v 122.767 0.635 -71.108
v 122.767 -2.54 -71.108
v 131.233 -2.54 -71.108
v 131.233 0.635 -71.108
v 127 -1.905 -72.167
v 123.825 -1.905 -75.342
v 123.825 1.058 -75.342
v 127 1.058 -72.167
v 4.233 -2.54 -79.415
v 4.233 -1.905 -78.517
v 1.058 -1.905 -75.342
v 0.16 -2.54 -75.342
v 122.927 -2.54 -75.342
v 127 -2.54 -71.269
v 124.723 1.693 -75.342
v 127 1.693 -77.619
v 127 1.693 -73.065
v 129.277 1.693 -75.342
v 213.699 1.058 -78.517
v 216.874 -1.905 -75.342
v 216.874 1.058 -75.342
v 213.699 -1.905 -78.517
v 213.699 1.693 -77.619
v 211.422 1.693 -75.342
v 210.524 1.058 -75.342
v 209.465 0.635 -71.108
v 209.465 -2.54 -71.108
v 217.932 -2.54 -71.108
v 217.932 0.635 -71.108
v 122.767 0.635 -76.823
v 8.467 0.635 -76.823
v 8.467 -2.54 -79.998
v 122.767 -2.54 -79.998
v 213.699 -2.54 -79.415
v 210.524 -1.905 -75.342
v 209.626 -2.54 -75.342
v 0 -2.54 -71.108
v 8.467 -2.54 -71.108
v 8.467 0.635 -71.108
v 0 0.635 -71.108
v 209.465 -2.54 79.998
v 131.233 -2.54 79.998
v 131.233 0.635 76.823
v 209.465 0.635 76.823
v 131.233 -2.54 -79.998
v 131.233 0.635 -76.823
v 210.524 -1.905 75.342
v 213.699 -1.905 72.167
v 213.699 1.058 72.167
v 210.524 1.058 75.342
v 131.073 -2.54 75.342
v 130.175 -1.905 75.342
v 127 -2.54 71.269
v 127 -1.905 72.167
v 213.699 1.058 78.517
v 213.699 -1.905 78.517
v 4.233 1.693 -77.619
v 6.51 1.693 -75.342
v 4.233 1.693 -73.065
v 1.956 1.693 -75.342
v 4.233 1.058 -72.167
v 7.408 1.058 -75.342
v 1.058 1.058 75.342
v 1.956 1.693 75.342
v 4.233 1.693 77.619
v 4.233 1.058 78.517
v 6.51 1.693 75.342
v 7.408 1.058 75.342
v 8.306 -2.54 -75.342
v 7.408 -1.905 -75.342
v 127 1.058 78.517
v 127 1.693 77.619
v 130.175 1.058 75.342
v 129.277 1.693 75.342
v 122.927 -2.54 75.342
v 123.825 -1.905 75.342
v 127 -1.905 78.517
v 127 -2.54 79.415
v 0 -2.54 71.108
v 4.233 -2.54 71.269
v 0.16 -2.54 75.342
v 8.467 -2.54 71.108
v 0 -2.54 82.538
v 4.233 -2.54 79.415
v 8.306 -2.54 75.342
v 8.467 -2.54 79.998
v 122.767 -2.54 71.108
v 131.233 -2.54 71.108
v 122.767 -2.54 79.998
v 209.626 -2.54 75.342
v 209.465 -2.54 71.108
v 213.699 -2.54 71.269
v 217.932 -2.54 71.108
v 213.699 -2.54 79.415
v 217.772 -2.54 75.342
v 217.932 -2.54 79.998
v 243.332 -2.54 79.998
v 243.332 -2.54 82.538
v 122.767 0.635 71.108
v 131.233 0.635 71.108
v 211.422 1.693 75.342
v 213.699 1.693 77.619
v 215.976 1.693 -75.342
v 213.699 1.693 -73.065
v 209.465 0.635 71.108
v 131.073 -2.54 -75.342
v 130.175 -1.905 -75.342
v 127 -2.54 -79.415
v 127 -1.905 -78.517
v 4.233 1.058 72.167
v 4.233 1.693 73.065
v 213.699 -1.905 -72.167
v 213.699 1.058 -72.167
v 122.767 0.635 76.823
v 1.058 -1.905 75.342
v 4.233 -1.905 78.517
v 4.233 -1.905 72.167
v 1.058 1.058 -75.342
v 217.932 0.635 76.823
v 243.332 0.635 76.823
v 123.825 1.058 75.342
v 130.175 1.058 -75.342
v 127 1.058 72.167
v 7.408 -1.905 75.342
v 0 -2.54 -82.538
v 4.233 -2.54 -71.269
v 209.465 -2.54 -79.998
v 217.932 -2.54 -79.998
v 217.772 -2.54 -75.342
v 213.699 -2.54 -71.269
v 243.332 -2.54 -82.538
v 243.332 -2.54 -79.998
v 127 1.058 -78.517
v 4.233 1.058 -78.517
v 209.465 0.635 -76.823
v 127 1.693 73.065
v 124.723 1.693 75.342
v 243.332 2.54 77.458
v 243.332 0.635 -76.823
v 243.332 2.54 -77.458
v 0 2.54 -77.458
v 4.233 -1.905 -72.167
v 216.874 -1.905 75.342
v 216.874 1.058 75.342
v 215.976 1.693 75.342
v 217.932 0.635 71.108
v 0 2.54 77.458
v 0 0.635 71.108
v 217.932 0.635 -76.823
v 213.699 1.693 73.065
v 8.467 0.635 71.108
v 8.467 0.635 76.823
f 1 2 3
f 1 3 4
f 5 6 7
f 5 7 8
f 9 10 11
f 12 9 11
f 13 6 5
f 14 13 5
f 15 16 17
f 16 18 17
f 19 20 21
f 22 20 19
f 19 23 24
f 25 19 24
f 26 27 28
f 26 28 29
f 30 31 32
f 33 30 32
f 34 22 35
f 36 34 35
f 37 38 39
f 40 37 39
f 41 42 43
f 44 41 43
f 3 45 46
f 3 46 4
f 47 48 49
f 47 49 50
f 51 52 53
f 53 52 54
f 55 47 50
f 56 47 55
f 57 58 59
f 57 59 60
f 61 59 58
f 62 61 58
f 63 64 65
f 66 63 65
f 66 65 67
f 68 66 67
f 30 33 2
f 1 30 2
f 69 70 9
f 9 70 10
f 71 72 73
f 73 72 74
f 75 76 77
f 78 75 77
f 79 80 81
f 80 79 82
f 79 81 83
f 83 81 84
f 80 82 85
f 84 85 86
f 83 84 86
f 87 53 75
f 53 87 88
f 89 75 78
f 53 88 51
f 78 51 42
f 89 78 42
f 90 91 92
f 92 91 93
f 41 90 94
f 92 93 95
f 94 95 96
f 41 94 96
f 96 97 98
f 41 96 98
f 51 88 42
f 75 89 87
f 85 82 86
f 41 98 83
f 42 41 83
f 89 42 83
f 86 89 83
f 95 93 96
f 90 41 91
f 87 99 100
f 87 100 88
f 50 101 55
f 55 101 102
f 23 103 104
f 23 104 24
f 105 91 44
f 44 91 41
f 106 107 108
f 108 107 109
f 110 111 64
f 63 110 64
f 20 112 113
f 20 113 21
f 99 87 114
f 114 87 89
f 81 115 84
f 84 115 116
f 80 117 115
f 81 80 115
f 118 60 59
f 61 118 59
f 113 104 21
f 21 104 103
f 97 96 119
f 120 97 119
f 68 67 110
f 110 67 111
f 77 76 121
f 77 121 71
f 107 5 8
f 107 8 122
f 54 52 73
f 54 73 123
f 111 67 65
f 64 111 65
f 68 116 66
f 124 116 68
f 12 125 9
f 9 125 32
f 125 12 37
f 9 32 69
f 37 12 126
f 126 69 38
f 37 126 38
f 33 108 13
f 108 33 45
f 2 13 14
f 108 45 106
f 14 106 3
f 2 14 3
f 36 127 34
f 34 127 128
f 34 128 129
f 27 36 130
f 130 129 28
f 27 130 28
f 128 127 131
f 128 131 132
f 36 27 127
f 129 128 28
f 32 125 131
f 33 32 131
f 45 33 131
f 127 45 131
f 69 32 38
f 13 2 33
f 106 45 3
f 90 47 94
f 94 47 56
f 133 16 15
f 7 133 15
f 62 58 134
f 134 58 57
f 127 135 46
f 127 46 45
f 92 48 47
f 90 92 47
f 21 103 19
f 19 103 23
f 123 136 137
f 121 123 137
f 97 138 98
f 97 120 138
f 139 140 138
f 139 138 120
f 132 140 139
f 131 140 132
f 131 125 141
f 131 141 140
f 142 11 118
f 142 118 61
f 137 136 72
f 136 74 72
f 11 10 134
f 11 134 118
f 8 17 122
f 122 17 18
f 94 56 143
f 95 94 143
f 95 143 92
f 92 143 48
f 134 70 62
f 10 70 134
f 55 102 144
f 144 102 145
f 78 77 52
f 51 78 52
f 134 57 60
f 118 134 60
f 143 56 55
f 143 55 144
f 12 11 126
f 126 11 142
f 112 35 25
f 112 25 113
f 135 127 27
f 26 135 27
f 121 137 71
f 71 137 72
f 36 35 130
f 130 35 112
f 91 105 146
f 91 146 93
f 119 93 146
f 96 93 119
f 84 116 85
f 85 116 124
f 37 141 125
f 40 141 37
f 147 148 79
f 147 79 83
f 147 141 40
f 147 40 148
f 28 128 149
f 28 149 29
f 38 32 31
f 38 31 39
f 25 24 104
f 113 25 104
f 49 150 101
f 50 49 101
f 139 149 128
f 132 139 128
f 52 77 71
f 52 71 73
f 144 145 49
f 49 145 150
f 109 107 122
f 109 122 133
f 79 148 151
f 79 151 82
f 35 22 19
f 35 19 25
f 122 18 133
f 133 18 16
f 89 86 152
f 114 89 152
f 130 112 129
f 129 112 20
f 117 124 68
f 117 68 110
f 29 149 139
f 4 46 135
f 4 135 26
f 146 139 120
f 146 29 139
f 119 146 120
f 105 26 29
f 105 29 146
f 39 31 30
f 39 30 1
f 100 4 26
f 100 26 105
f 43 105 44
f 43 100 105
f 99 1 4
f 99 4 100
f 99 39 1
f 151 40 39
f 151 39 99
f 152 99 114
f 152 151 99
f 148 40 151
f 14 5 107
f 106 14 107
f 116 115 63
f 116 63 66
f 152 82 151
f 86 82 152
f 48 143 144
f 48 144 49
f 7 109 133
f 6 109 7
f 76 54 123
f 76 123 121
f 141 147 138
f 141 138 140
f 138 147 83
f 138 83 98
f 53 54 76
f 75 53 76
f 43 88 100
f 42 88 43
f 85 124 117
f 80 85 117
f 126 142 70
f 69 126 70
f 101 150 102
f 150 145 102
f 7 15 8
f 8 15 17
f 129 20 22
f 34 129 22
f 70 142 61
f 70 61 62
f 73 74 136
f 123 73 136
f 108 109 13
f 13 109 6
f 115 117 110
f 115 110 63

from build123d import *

# Parameters (mm, degrees)
BOSS_EXTRUDE1_DEPTH = 243.332
SKETCH2_W           = 114.3
SKETCH2_H           = 161.266666628
SKETCH2_W_2         = 78.232
SKETCH2_W_3         = 25.4
CUT_EXTRUDE1_DEPTH  = 3.175
CUT_EXTRUDE2_DEPTH  = 4.233333333
CHAMFER4_SIZE       = 0.635
CHAMFER3_SIZE       = 3.81
CHAMFER2_SIZE       = 5.08


# Some blends are built 0.0001 mm under size
with BuildPart() as part:
    # Sketch1 → Boss-Extrude1 (new body)
    with BuildSketch(Plane(origin=(0, 0, 0), x_dir=(0, 0, -1), z_dir=(1, 0, 0))):
        Polygon((-82.538333314, 2.54), (82.538333314, 2.54), (82.538333314, -2.54), (71.108333314, -2.54), (71.108333314, 0.635), (-71.108333314, 0.635), (-71.108333314, -2.54), (-82.538333314, -2.54), align=None)
    extrude(amount=BOSS_EXTRUDE1_DEPTH)

    # Sketch2 → Cut-Extrude1 (cut)
    with BuildSketch(Plane.XZ.offset(2.54)):
        with Locations((65.616666667, 0)):
            Rectangle(SKETCH2_W, SKETCH2_H)
        with Locations((170.349333333, 0)):
            Rectangle(SKETCH2_W_2, SKETCH2_H)
        with Locations((230.632, 0)):
            Rectangle(SKETCH2_W_3, SKETCH2_H)
    extrude(amount=-CUT_EXTRUDE1_DEPTH, mode=Mode.SUBTRACT)

    # Sketch4 → Cut-Extrude2 (cut)
    with BuildSketch(Plane.XZ.offset(2.54)):
        Polygon((4.233333333, 78.516666648), (7.408333333, 75.341666648), (4.233333333, 72.166666648), (1.058333333, 75.341666648), align=None)
        Polygon((210.523666667, 75.341666648), (213.698666667, 78.516666648), (216.873666667, 75.341666648), (213.698666667, 72.166666648), align=None)
        Polygon((123.825, 75.341666648), (127, 78.516666648), (130.175, 75.341666648), (127, 72.166666648), align=None)
        Polygon((1.058333333, -75.341666648), (4.233333333, -72.166666648), (7.408333333, -75.341666648), (4.233333333, -78.516666648), align=None)
        Polygon((123.825, -75.341666648), (127, -72.166666648), (130.175, -75.341666648), (127, -78.516666648), align=None)
        Polygon((210.523666667, -75.341666648), (213.698666667, -72.166666648), (216.873666667, -75.341666648), (213.698666667, -78.516666648), align=None)
    extrude(amount=-CUT_EXTRUDE2_DEPTH, mode=Mode.SUBTRACT)

    # Chamfer4
    chamfer4_edges = [part.edges().sort_by_distance(p)[0] for p in [
        (125.4125, 1.693333333, 73.754166648),
        (125.4125, 1.693333333, 76.929166648),
        (128.5875, 1.693333333, 76.929166648),
        (128.5875, 1.693333333, 73.754166648),
        (125.4125, -2.54, 73.754166648),
        (128.5875, -2.54, 73.754166648),
        (128.5875, -2.54, 76.929166648),
        (125.4125, -2.54, 76.929166648),
        (212.111166667, 1.693333333, 73.754166648),
        (212.111166667, 1.693333333, 76.929166648),
        (215.286166667, 1.693333333, 76.929166648),
        (215.286166667, 1.693333333, 73.754166648),
        (212.111166667, -2.54, 73.754166648),
        (215.286166667, -2.54, 73.754166648),
        (215.286166667, -2.54, 76.929166648),
        (212.111166667, -2.54, 76.929166648),
        (2.645833333, 1.693333333, -76.929166648),
        (2.645833333, 1.693333333, -73.754166648),
        (5.820833333, 1.693333333, -73.754166648),
        (5.820833333, 1.693333333, -76.929166648),
        (2.645833333, -2.54, -76.929166648),
        (5.820833333, -2.54, -76.929166648),
        (5.820833333, -2.54, -73.754166648),
        (2.645833333, -2.54, -73.754166648),
        (125.4125, 1.693333333, -76.929166648),
        (125.4125, 1.693333333, -73.754166648),
        (128.5875, 1.693333333, -73.754166648),
        (128.5875, 1.693333333, -76.929166648),
        (125.4125, -2.54, -76.929166648),
        (128.5875, -2.54, -76.929166648),
        (128.5875, -2.54, -73.754166648),
        (125.4125, -2.54, -73.754166648),
        (212.111166667, 1.693333333, -76.929166648),
        (212.111166667, 1.693333333, -73.754166648),
        (215.286166667, 1.693333333, -73.754166648),
        (215.286166667, 1.693333333, -76.929166648),
        (212.111166667, -2.54, -76.929166648),
        (215.286166667, -2.54, -76.929166648),
        (215.286166667, -2.54, -73.754166648),
        (212.111166667, -2.54, -73.754166648),
        (2.645833333, 1.693333333, 76.929166648),
        (5.820833333, 1.693333333, 76.929166648),
        (5.820833333, 1.693333333, 73.754166648),
        (2.645833333, 1.693333333, 73.754166648),
        (2.645833333, -2.54, 76.929166648),
        (2.645833333, -2.54, 73.754166648),
        (5.820833333, -2.54, 73.754166648),
        (5.820833333, -2.54, 76.929166648),
    ]]
    chamfer(chamfer4_edges, length=CHAMFER4_SIZE)

    # Chamfer3
    # the kernel refuses this chamfer: 3.81 mm, written as the material it adds along each edge
    with BuildSketch(Plane(origin=(132.564778851, 0.635, -80.633333314), x_dir=(0, 0.027495876610586334, 0.9996219169112968), z_dir=(-1, 0, 0))) as chamfer3_piece_1_section:
        Polygon((CHAMFER3_SIZE * 0.999621916911, -CHAMFER3_SIZE * 0.0274958766106), (-CHAMFER3_SIZE * 0.0274958766106, -CHAMFER3_SIZE * 0.999621916911), (0, 0), align=None)
    chamfer3_piece_1 = extrude(amount=133.896224368, mode=Mode.PRIVATE)
    chamfer3_piece_1 = split(chamfer3_piece_1, bisect_by=Plane(origin=(131.899056092, -2.54, -79.333095219), z_dir=(0, 1, 0)), keep=Keep.TOP, mode=Mode.PRIVATE)
    chamfer3_piece_1 = split(chamfer3_piece_1, bisect_by=Plane(origin=(129.04131376, -0.57452381, -76.475352887), z_dir=(0.7071067811865444, 0, -0.7071067811865507)), keep=Keep.TOP, mode=Mode.PRIVATE)
    add(chamfer3_piece_1)
    with BuildSketch(Plane(origin=(132.564778851, 0.635, -80.633333314), x_dir=(0, 0.027495876610586334, 0.9996219169112968), z_dir=(-1, 0, 0))) as chamfer3_piece_2_section:
        Polygon((CHAMFER3_SIZE * 0.999621916911, -CHAMFER3_SIZE * 0.0274958766106), (-CHAMFER3_SIZE * 0.0274958766106, -CHAMFER3_SIZE * 0.999621916911), (0, 0), align=None)
    chamfer3_piece_2 = extrude(amount=133.896224368, mode=Mode.PRIVATE)
    chamfer3_piece_2 = split(chamfer3_piece_2, bisect_by=Plane(origin=(65.616666667, -2.54, -79.333095219), z_dir=(0, 1, 0)), keep=Keep.TOP, mode=Mode.PRIVATE)
    chamfer3_piece_2 = split(chamfer3_piece_2, bisect_by=Plane(origin=(34.516785714, -0.57452381, -48.233214267), z_dir=(0.7071067811865476, 0, -0.7071067811865476)), keep=Keep.TOP, mode=Mode.PRIVATE)
    chamfer3_piece_2 = split(chamfer3_piece_2, bisect_by=Plane(origin=(96.716547619, -0.57452381, -48.233214267), z_dir=(-0.7071067811865444, 0, -0.7071067811865507)), keep=Keep.TOP, mode=Mode.PRIVATE)
    add(chamfer3_piece_2)
    with BuildSketch(Plane(origin=(219.263445517, 0.635, -80.633333314), x_dir=(0, 0.027495876610586334, 0.9996219169112968), z_dir=(-1, 0, 0))) as chamfer3_piece_3_section:
        Polygon((CHAMFER3_SIZE * 0.999621916911, -CHAMFER3_SIZE * 0.0274958766106), (-CHAMFER3_SIZE * 0.0274958766106, -CHAMFER3_SIZE * 0.999621916911), (0, 0), align=None)
    chamfer3_piece_3 = extrude(amount=97.828224368, mode=Mode.PRIVATE)
    chamfer3_piece_3 = split(chamfer3_piece_3, bisect_by=Plane(origin=(218.597722759, -2.54, -79.333095219), z_dir=(0, 1, 0)), keep=Keep.TOP, mode=Mode.PRIVATE)
    chamfer3_piece_3 = split(chamfer3_piece_3, bisect_by=Plane(origin=(215.739980427, -0.57452381, -76.475352887), z_dir=(0.7071067811865507, 0, -0.7071067811865444)), keep=Keep.TOP, mode=Mode.PRIVATE)
    add(chamfer3_piece_3)
    with BuildSketch(Plane(origin=(219.263445517, 0.635, -80.633333314), x_dir=(0, 0.027495876610586334, 0.9996219169112968), z_dir=(-1, 0, 0))) as chamfer3_piece_4_section:
        Polygon((CHAMFER3_SIZE * 0.999621916911, -CHAMFER3_SIZE * 0.0274958766106), (-CHAMFER3_SIZE * 0.0274958766106, -CHAMFER3_SIZE * 0.999621916911), (0, 0), align=None)
    chamfer3_piece_4 = extrude(amount=97.828224368, mode=Mode.PRIVATE)
    chamfer3_piece_4 = split(chamfer3_piece_4, bisect_by=Plane(origin=(170.349333333, -2.54, -79.333095219), z_dir=(0, 1, 0)), keep=Keep.TOP, mode=Mode.PRIVATE)
    chamfer3_piece_4 = split(chamfer3_piece_4, bisect_by=Plane(origin=(148.266452381, -0.57452381, -57.250214267), z_dir=(0.7071067811865444, 0, -0.7071067811865507)), keep=Keep.TOP, mode=Mode.PRIVATE)
    chamfer3_piece_4 = split(chamfer3_piece_4, bisect_by=Plane(origin=(192.432214286, -0.57452381, -57.250214267), z_dir=(-0.7071067811865507, 0, -0.7071067811865444)), keep=Keep.TOP, mode=Mode.PRIVATE)
    add(chamfer3_piece_4)
    with BuildSketch(Plane(origin=(219.263445517, 0.635, -80.633333314), x_dir=(0, 0.027495876610586334, 0.9996219169112968), z_dir=(-1, 0, 0))) as chamfer3_piece_5_section:
        Polygon((CHAMFER3_SIZE * 0.999621916911, -CHAMFER3_SIZE * 0.0274958766106), (-CHAMFER3_SIZE * 0.0274958766106, -CHAMFER3_SIZE * 0.999621916911), (0, 0), align=None)
    chamfer3_piece_5 = extrude(amount=97.828224368, mode=Mode.PRIVATE)
    chamfer3_piece_5 = split(chamfer3_piece_5, bisect_by=Plane(origin=(122.100943908, -2.54, -79.333095219), z_dir=(0, 1, 0)), keep=Keep.TOP, mode=Mode.PRIVATE)
    chamfer3_piece_5 = split(chamfer3_piece_5, bisect_by=Plane(origin=(124.95868624, -0.57452381, -76.475352887), z_dir=(-0.7071067811865444, 0, -0.7071067811865507)), keep=Keep.TOP, mode=Mode.PRIVATE)
    add(chamfer3_piece_5)
    with BuildSketch(Plane(origin=(243.332, 0.635, -80.633333314), x_dir=(0, 0.027495876610580335, 0.999621916911297), z_dir=(-1, 0, 0))) as chamfer3_piece_6_section:
        Polygon((CHAMFER3_SIZE * 0.999621916911, -CHAMFER3_SIZE * 0.0274958766106), (-CHAMFER3_SIZE * 0.0274958766106, -CHAMFER3_SIZE * 0.999621916911), (0, 0), align=None)
    chamfer3_piece_6 = extrude(amount=35.198112184, mode=Mode.PRIVATE)
    chamfer3_piece_6 = split(chamfer3_piece_6, bisect_by=Plane(origin=(230.632, -2.54, -79.333095219), z_dir=(0, 1, 0)), keep=Keep.TOP, mode=Mode.PRIVATE)
    chamfer3_piece_6 = split(chamfer3_piece_6, bisect_by=Plane(origin=(221.757119048, -0.57452381, -70.458214267), z_dir=(0.7071067811865507, 0, -0.7071067811865444)), keep=Keep.TOP, mode=Mode.PRIVATE)
    add(chamfer3_piece_6)
    with BuildSketch(Plane(origin=(253.130112184, 0.635, -80.633333314), x_dir=(0, 0.027495876610586334, 0.9996219169112968), z_dir=(-1, 0, 0))) as chamfer3_piece_7_section:
        Polygon((CHAMFER3_SIZE * 0.999621916911, -CHAMFER3_SIZE * 0.0274958766106), (-CHAMFER3_SIZE * 0.0274958766106, -CHAMFER3_SIZE * 0.999621916911), (0, 0), align=None)
    chamfer3_piece_7 = extrude(amount=44.996224368, mode=Mode.PRIVATE)
    chamfer3_piece_7 = split(chamfer3_piece_7, bisect_by=Plane(origin=(208.799610575, -2.54, -79.333095219), z_dir=(0, 1, 0)), keep=Keep.TOP, mode=Mode.PRIVATE)
    chamfer3_piece_7 = split(chamfer3_piece_7, bisect_by=Plane(origin=(211.657352906, -0.57452381, -76.475352887), z_dir=(-0.7071067811865507, 0, -0.7071067811865444)), keep=Keep.TOP, mode=Mode.PRIVATE)
    add(chamfer3_piece_7)
    with BuildSketch(Plane(origin=(208.133887816, 0.635, 80.633333314), x_dir=(0, -0.9996219169112968, 0.027495876610586382), z_dir=(1, 0, 0))) as chamfer3_piece_8_section:
        Polygon((CHAMFER3_SIZE * 0.999621916911, CHAMFER3_SIZE * 0.0274958766106), (-CHAMFER3_SIZE * 0.0274958766106, CHAMFER3_SIZE * 0.999621916911), (0, 0), align=None)
    chamfer3_piece_8 = extrude(amount=44.996224368, mode=Mode.PRIVATE)
    chamfer3_piece_8 = split(chamfer3_piece_8, bisect_by=Plane(origin=(208.799610575, -2.54, 79.333095219), z_dir=(0, 1, 0)), keep=Keep.TOP, mode=Mode.PRIVATE)
    chamfer3_piece_8 = split(chamfer3_piece_8, bisect_by=Plane(origin=(211.657352906, -0.57452381, 76.475352887), z_dir=(-0.7071067811865301, 0, 0.7071067811865649)), keep=Keep.TOP, mode=Mode.PRIVATE)
    add(chamfer3_piece_8)
    with BuildSketch(Plane(origin=(208.133887816, 0.635, 80.633333314), x_dir=(0, -0.9996219169112968, 0.027495876610586382), z_dir=(1, 0, 0))) as chamfer3_piece_9_section:
        Polygon((CHAMFER3_SIZE * 0.999621916911, CHAMFER3_SIZE * 0.0274958766106), (-CHAMFER3_SIZE * 0.0274958766106, CHAMFER3_SIZE * 0.999621916911), (0, 0), align=None)
    chamfer3_piece_9 = extrude(amount=35.198112184, mode=Mode.PRIVATE)
    chamfer3_piece_9 = split(chamfer3_piece_9, bisect_by=Plane(origin=(230.632, -2.54, 79.333095219), z_dir=(0, 1, 0)), keep=Keep.TOP, mode=Mode.PRIVATE)
    chamfer3_piece_9 = split(chamfer3_piece_9, bisect_by=Plane(origin=(221.757119048, -0.57452381, 70.458214267), z_dir=(0.7071067811865619, 0, 0.7071067811865334)), keep=Keep.TOP, mode=Mode.PRIVATE)
    add(chamfer3_piece_9)
    with BuildSketch(Plane(origin=(121.435221149, 0.635, 80.633333314), x_dir=(0, -0.9996219169112968, 0.027495876610586382), z_dir=(1, 0, 0))) as chamfer3_piece_10_section:
        Polygon((CHAMFER3_SIZE * 0.999621916911, CHAMFER3_SIZE * 0.0274958766106), (-CHAMFER3_SIZE * 0.0274958766106, CHAMFER3_SIZE * 0.999621916911), (0, 0), align=None)
    chamfer3_piece_10 = extrude(amount=97.828224368, mode=Mode.PRIVATE)
    chamfer3_piece_10 = split(chamfer3_piece_10, bisect_by=Plane(origin=(122.100943908, -2.54, 79.333095219), z_dir=(0, 1, 0)), keep=Keep.TOP, mode=Mode.PRIVATE)
    chamfer3_piece_10 = split(chamfer3_piece_10, bisect_by=Plane(origin=(124.95868624, -0.57452381, 76.475352887), z_dir=(-0.7071067811865476, 0, 0.7071067811865476)), keep=Keep.TOP, mode=Mode.PRIVATE)
    add(chamfer3_piece_10)
    with BuildSketch(Plane(origin=(121.435221149, 0.635, 80.633333314), x_dir=(0, -0.9996219169112968, 0.027495876610586382), z_dir=(1, 0, 0))) as chamfer3_piece_11_section:
        Polygon((CHAMFER3_SIZE * 0.999621916911, CHAMFER3_SIZE * 0.0274958766106), (-CHAMFER3_SIZE * 0.0274958766106, CHAMFER3_SIZE * 0.999621916911), (0, 0), align=None)
    chamfer3_piece_11 = extrude(amount=97.828224368, mode=Mode.PRIVATE)
    chamfer3_piece_11 = split(chamfer3_piece_11, bisect_by=Plane(origin=(170.349333333, -2.54, 79.333095219), z_dir=(0, 1, 0)), keep=Keep.TOP, mode=Mode.PRIVATE)
    chamfer3_piece_11 = split(chamfer3_piece_11, bisect_by=Plane(origin=(148.266452381, -0.57452381, 57.250214267), z_dir=(0.7071067811865459, 0, 0.7071067811865491)), keep=Keep.TOP, mode=Mode.PRIVATE)
    chamfer3_piece_11 = split(chamfer3_piece_11, bisect_by=Plane(origin=(192.432214286, -0.57452381, 57.250214267), z_dir=(-0.7071067811865301, 0, 0.7071067811865649)), keep=Keep.TOP, mode=Mode.PRIVATE)
    add(chamfer3_piece_11)
    with BuildSketch(Plane(origin=(121.435221149, 0.635, 80.633333314), x_dir=(0, -0.9996219169112968, 0.027495876610586382), z_dir=(1, 0, 0))) as chamfer3_piece_12_section:
        Polygon((CHAMFER3_SIZE * 0.999621916911, CHAMFER3_SIZE * 0.0274958766106), (-CHAMFER3_SIZE * 0.0274958766106, CHAMFER3_SIZE * 0.999621916911), (0, 0), align=None)
    chamfer3_piece_12 = extrude(amount=97.828224368, mode=Mode.PRIVATE)
    chamfer3_piece_12 = split(chamfer3_piece_12, bisect_by=Plane(origin=(218.597722759, -2.54, 79.333095219), z_dir=(0, 1, 0)), keep=Keep.TOP, mode=Mode.PRIVATE)
    chamfer3_piece_12 = split(chamfer3_piece_12, bisect_by=Plane(origin=(215.739980427, -0.57452381, 76.475352887), z_dir=(0.7071067811865619, 0, 0.7071067811865334)), keep=Keep.TOP, mode=Mode.PRIVATE)
    add(chamfer3_piece_12)
    with BuildSketch(Plane(origin=(-1.331445517, 0.635, 80.633333314), x_dir=(0, -0.9996219169112968, 0.027495876610586382), z_dir=(1, 0, 0))) as chamfer3_piece_13_section:
        Polygon((CHAMFER3_SIZE * 0.999621916911, CHAMFER3_SIZE * 0.0274958766106), (-CHAMFER3_SIZE * 0.0274958766106, CHAMFER3_SIZE * 0.999621916911), (0, 0), align=None)
    chamfer3_piece_13 = extrude(amount=133.896224368, mode=Mode.PRIVATE)
    chamfer3_piece_13 = split(chamfer3_piece_13, bisect_by=Plane(origin=(65.616666667, -2.54, 79.333095219), z_dir=(0, 1, 0)), keep=Keep.TOP, mode=Mode.PRIVATE)
    chamfer3_piece_13 = split(chamfer3_piece_13, bisect_by=Plane(origin=(96.716547619, -0.57452381, 48.233214267), z_dir=(-0.7071067811865476, 0, 0.7071067811865476)), keep=Keep.TOP, mode=Mode.PRIVATE)
    chamfer3_piece_13 = split(chamfer3_piece_13, bisect_by=Plane(origin=(34.516785714, -0.57452381, 48.233214267), z_dir=(0.7071067811865476, 0, 0.7071067811865476)), keep=Keep.TOP, mode=Mode.PRIVATE)
    add(chamfer3_piece_13)
    with BuildSketch(Plane(origin=(-1.331445517, 0.635, 80.633333314), x_dir=(0, -0.9996219169112968, 0.027495876610586382), z_dir=(1, 0, 0))) as chamfer3_piece_14_section:
        Polygon((CHAMFER3_SIZE * 0.999621916911, CHAMFER3_SIZE * 0.0274958766106), (-CHAMFER3_SIZE * 0.0274958766106, CHAMFER3_SIZE * 0.999621916911), (0, 0), align=None)
    chamfer3_piece_14 = extrude(amount=133.896224368, mode=Mode.PRIVATE)
    chamfer3_piece_14 = split(chamfer3_piece_14, bisect_by=Plane(origin=(131.899056092, -2.54, 79.333095219), z_dir=(0, 1, 0)), keep=Keep.TOP, mode=Mode.PRIVATE)
    chamfer3_piece_14 = split(chamfer3_piece_14, bisect_by=Plane(origin=(129.04131376, -0.57452381, 76.475352887), z_dir=(0.7071067811865459, 0, 0.7071067811865491)), keep=Keep.TOP, mode=Mode.PRIVATE)
    add(chamfer3_piece_14)

    # Chamfer2
    chamfer2_edges = [part.edges().sort_by_distance(p)[0] for p in [
        (121.666, 2.54, 82.538333314),
        (121.666, 2.54, -82.538333314),
    ]]
    chamfer(chamfer2_edges, length=CHAMFER2_SIZE - 0.0001)  # a hair under: the kernel refuses the full size


solid = part.part
